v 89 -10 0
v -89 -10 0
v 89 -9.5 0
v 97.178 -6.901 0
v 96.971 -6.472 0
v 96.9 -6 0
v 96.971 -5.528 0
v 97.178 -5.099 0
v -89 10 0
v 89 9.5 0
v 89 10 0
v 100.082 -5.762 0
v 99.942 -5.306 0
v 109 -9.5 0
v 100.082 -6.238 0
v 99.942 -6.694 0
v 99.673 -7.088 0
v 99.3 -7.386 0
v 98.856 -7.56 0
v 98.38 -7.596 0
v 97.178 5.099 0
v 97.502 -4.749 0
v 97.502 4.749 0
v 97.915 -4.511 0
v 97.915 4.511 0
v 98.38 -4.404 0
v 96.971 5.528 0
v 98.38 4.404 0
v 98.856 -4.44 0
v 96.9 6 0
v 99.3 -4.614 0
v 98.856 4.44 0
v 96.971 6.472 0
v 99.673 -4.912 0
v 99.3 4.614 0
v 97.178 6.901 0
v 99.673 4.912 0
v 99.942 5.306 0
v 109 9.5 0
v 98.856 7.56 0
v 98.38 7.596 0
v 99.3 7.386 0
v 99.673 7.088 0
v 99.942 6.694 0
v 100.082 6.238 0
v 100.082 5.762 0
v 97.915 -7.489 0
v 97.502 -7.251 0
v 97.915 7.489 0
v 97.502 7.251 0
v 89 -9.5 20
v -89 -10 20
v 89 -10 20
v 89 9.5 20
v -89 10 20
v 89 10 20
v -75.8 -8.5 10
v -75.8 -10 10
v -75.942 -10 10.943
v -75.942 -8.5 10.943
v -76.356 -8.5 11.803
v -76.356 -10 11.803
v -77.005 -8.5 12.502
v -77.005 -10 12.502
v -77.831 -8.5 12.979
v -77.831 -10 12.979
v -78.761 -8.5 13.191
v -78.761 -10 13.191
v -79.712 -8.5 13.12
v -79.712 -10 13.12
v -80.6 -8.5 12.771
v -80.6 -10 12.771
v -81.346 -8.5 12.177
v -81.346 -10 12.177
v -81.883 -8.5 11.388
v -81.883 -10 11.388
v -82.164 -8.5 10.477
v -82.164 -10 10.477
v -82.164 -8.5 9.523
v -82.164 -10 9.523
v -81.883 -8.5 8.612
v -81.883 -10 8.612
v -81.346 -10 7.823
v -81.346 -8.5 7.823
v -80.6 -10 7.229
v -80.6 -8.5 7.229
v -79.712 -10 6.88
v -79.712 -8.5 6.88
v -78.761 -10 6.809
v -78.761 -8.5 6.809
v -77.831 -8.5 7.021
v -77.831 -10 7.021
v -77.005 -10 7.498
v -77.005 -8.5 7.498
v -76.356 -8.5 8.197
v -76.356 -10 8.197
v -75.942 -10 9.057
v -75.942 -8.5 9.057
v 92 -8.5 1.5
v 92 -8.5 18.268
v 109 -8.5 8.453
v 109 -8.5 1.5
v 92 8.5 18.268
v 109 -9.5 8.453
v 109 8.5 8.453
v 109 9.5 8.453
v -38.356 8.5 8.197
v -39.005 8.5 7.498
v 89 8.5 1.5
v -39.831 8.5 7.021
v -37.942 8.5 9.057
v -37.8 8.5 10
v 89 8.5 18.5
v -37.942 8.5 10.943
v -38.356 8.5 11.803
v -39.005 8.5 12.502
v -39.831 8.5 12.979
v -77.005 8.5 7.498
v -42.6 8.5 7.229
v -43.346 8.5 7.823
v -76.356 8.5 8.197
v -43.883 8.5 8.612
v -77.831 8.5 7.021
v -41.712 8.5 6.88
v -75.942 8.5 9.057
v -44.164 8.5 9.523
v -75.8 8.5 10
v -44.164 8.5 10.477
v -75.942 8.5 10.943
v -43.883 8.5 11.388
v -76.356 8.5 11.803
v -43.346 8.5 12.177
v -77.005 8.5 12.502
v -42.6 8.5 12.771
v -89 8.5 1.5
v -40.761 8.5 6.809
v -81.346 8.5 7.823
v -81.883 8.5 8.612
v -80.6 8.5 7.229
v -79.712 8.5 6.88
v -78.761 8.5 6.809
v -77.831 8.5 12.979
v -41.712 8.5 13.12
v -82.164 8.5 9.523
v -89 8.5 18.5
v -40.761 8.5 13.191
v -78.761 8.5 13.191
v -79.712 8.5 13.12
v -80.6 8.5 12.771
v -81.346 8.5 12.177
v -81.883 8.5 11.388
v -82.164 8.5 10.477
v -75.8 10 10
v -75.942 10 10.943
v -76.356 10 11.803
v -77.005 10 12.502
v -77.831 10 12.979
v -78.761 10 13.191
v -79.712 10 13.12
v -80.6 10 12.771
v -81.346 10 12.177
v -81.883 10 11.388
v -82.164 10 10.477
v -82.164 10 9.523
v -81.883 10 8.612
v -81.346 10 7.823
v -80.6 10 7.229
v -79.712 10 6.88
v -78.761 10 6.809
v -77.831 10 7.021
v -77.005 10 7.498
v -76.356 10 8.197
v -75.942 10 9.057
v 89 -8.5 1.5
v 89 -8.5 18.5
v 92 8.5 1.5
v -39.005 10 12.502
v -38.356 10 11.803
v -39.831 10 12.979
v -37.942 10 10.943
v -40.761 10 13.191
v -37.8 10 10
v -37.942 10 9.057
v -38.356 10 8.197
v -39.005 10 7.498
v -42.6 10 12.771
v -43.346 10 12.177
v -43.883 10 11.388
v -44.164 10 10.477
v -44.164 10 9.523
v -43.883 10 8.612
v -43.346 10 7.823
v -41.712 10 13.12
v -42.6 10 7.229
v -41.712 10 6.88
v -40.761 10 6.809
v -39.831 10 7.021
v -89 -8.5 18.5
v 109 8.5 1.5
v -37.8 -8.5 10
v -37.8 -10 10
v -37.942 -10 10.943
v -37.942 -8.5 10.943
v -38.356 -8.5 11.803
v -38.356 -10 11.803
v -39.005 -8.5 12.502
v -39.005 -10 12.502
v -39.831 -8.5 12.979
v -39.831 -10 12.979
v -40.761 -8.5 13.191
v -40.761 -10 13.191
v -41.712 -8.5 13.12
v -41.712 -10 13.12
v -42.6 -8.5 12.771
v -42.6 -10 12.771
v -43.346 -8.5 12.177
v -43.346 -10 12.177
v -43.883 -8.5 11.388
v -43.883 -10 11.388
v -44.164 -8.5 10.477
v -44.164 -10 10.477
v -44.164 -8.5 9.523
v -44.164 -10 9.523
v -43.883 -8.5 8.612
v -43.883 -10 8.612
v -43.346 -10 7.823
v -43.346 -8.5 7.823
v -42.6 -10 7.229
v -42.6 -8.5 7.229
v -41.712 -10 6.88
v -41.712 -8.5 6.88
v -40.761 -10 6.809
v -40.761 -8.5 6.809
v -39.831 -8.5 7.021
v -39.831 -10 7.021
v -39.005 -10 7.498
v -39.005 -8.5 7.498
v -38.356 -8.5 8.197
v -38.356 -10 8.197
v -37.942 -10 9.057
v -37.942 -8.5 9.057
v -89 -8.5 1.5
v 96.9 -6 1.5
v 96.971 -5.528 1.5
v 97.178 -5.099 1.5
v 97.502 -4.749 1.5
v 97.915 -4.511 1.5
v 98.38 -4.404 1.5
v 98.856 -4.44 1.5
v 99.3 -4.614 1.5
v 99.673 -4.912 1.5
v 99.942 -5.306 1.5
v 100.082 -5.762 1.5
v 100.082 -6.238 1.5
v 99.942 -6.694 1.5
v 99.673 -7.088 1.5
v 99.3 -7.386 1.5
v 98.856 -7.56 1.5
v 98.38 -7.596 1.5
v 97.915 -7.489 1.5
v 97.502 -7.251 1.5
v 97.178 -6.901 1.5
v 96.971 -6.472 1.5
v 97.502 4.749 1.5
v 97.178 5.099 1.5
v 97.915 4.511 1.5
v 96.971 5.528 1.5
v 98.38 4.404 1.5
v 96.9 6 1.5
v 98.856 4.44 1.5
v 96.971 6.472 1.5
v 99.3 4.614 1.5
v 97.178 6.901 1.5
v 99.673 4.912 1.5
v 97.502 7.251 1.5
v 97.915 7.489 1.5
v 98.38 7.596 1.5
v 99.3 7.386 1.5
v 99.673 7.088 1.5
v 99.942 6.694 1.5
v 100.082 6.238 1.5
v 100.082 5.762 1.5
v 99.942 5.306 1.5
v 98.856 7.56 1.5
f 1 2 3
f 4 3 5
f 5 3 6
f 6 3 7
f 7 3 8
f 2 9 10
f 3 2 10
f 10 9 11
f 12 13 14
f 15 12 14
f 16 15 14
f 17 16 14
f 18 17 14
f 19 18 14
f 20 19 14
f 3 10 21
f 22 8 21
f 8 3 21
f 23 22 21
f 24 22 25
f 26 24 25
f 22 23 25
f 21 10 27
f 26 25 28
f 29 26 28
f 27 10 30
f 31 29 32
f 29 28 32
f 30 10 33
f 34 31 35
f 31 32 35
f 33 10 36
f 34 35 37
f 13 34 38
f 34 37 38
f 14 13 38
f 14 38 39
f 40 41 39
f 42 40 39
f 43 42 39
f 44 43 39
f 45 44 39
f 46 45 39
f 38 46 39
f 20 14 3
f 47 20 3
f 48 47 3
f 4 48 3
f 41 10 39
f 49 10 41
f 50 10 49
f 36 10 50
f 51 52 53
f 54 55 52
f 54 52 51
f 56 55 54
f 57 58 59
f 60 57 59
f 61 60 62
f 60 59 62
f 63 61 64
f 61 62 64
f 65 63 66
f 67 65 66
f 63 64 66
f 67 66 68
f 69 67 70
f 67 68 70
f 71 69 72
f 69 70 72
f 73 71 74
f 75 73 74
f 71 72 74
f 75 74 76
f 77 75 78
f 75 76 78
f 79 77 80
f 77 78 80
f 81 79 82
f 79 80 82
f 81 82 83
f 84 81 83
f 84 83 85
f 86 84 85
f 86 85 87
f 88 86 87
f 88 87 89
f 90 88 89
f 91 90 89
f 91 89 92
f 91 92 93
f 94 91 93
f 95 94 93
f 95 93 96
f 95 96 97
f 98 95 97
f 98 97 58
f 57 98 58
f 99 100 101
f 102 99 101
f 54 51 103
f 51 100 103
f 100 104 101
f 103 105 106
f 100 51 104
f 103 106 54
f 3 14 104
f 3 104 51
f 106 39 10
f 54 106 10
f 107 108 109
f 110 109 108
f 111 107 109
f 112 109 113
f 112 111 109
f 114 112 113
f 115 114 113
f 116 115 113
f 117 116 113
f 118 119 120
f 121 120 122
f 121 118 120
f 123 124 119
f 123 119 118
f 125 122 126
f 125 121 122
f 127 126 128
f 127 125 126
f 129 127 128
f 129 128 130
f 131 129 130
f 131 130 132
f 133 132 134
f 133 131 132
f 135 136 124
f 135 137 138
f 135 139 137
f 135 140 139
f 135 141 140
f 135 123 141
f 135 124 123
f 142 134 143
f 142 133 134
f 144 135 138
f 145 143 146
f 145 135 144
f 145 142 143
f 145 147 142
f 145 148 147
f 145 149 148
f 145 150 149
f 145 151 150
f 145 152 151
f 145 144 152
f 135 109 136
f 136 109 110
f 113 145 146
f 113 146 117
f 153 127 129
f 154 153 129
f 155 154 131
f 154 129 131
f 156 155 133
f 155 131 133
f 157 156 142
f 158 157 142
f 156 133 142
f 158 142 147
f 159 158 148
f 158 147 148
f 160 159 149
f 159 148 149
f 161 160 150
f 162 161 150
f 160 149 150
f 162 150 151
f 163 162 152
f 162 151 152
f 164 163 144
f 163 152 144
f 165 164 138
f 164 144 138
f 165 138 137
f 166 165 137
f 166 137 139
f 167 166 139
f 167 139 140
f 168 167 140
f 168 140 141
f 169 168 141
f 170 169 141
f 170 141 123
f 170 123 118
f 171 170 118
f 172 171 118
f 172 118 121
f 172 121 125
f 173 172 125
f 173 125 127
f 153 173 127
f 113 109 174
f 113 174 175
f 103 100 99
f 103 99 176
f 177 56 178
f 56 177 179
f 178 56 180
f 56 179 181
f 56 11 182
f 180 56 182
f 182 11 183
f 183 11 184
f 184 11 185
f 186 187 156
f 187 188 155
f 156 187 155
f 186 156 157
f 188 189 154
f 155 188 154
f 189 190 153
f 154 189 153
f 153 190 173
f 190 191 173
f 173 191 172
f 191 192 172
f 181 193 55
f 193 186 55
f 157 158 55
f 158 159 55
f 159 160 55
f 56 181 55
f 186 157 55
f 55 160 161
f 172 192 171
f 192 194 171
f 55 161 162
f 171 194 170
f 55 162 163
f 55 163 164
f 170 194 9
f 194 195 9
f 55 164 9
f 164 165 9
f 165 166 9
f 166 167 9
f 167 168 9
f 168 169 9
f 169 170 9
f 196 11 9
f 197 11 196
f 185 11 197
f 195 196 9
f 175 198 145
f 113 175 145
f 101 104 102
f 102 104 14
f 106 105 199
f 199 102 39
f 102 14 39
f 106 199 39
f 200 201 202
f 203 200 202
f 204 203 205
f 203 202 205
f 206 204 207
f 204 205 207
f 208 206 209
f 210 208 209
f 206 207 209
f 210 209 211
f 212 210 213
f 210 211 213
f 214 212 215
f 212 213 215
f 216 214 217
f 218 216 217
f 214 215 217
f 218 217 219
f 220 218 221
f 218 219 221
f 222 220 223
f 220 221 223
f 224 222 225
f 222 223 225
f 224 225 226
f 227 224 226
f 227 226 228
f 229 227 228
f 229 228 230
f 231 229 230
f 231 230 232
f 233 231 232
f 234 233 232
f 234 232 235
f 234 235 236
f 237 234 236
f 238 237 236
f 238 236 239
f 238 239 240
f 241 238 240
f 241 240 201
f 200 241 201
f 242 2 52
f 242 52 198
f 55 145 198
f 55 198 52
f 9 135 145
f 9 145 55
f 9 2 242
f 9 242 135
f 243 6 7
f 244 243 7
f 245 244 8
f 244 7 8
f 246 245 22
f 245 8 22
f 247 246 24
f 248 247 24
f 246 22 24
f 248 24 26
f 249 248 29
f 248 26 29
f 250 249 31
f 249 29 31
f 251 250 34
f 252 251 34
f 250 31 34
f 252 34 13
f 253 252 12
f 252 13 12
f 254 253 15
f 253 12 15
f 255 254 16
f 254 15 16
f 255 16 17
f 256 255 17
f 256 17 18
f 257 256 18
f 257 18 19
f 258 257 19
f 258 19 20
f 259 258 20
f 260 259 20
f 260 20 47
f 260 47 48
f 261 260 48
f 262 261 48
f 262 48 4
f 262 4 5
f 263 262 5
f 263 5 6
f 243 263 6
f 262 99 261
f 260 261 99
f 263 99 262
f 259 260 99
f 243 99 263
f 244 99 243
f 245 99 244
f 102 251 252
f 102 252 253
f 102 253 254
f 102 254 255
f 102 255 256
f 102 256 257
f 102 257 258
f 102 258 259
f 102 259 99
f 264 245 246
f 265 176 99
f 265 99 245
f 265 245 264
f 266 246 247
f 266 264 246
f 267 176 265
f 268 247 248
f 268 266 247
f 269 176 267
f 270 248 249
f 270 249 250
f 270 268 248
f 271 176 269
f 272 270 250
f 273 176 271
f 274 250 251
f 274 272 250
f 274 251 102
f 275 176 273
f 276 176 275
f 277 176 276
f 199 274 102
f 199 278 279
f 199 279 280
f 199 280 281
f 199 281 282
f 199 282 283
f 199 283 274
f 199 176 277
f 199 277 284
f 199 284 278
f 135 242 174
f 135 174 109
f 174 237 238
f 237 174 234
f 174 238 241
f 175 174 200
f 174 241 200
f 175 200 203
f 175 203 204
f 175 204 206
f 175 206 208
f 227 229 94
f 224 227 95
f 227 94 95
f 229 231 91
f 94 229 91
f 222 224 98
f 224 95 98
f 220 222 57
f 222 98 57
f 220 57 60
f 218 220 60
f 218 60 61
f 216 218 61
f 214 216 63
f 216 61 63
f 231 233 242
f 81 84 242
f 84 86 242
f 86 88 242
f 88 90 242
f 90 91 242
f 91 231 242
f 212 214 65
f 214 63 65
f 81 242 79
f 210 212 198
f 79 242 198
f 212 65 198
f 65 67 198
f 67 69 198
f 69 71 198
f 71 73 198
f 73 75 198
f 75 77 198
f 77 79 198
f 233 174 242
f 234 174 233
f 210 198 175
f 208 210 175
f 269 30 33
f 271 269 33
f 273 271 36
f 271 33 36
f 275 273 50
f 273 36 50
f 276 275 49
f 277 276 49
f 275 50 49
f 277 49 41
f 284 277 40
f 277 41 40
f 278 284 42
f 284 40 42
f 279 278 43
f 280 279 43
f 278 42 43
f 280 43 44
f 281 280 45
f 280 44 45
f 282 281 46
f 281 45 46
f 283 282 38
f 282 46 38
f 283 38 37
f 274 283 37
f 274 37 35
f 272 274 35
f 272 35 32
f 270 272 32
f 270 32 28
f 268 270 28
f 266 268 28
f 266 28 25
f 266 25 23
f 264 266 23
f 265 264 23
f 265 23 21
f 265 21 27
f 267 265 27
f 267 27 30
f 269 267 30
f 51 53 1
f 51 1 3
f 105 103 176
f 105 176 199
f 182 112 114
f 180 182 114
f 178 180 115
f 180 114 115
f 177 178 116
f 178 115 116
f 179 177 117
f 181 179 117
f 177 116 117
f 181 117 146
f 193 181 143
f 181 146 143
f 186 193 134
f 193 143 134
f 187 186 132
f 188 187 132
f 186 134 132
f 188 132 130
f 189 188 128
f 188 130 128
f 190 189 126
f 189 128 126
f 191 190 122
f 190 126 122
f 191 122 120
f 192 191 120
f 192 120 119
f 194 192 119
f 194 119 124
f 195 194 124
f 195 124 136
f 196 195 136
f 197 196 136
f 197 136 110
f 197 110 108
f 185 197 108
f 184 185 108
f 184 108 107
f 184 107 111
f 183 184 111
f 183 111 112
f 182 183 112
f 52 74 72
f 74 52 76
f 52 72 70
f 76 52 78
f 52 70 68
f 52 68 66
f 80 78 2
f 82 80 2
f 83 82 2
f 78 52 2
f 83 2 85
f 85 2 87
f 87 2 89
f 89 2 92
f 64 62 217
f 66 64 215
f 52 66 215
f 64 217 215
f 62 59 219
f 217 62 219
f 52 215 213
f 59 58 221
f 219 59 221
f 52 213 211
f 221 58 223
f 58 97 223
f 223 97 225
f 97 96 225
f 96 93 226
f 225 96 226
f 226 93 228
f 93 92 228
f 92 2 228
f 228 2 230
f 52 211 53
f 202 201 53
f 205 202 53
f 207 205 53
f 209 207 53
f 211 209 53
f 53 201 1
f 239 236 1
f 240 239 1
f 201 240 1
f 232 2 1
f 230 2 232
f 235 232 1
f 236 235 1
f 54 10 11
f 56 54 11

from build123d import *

# Parameters (mm, degrees)
ESQUISSE1_W             = 178
ESQUISSE1_H             = 20
ESQUISSE1_W_2           = 20
BOSS_EXTRU_1_DEPTH      = 20
ESQUISSE3_W             = 17
ESQUISSE3_H             = 17
ENL_V_MAT_EXTRU_1_DEPTH = 178
ESQUISSE4_W             = 17
ESQUISSE4_H             = 17
ENL_V_MAT_EXTRU_2_DEPTH = 18.5
CHANFREIN1_SIZE         = 20
CHANFREIN1_SIZE2        = 11.547005384
ESQUISSE5_W             = 20
ESQUISSE5_H             = 0.5
ENL_V_MAT_EXTRU_3_DEPTH = 24
ESQUISSE6_R             = 1.6
ENL_V_MAT_EXTRU_4_DEPTH = 24
ESQUISSE7_R             = 3.2
ENL_V_MAT_EXTRU_5_DEPTH = 34


with BuildPart() as part:
    # Esquisse1 → Boss.-Extru.1 (new body)
    with BuildSketch(Plane.XY):
        Rectangle(ESQUISSE1_W, ESQUISSE1_H)
        with Locations((99, 0)):
            Rectangle(ESQUISSE1_W_2, ESQUISSE1_H)
    extrude(amount=BOSS_EXTRU_1_DEPTH)

    # Esquisse3 → Enlèv. mat.-Extru.1 (cut)
    with BuildSketch(Plane.ZY.offset(89)):
        with Locations((10, 0)):
            Rectangle(ESQUISSE3_W, ESQUISSE3_H)
    extrude(amount=-ENL_V_MAT_EXTRU_1_DEPTH, mode=Mode.SUBTRACT)

    # Esquisse4 → Enlèv. mat.-Extru.2 (cut)
    with BuildSketch(Plane.XY.offset(20)):
        with Locations((100.5, 0)):
            Rectangle(ESQUISSE4_W, ESQUISSE4_H)
    extrude(amount=-ENL_V_MAT_EXTRU_2_DEPTH, mode=Mode.SUBTRACT)

    # Chanfrein1
    chanfrein1_edges = [part.edges().sort_by_distance(p)[0] for p in [
        (109, 9.25, 20),
    ]]
    chanfrein1_side = [part.faces().sort_by_distance(p)[0] for p in [
        (2.875374557, 0, 20),
    ]]
    chamfer(chanfrein1_edges, length=CHANFREIN1_SIZE, length2=CHANFREIN1_SIZE2, reference=chanfrein1_side[0])

    # Esquisse5 → Enlèv. mat.-Extru.3 (cut)
    with BuildSketch(Plane(origin=(0, 0, 0), x_dir=(-1, 0, 0), z_dir=(0, 0, -1))):
        with Locations((-99, 9.75)):
            Rectangle(ESQUISSE5_W, ESQUISSE5_H)
        with Locations((-99, -9.75)):
            Rectangle(ESQUISSE5_W, ESQUISSE5_H)
    extrude(amount=-ENL_V_MAT_EXTRU_3_DEPTH, mode=Mode.SUBTRACT)

    # Esquisse6 → Enlèv. mat.-Extru.4 (cut)
    with BuildSketch(Plane(origin=(0, 0, 0), x_dir=(-1, 0, 0), z_dir=(0, 0, -1))):
        with Locations((-98.5, 6)):
            Circle(ESQUISSE6_R)
        with Locations((-98.5, -6)):
            Circle(ESQUISSE6_R)
    extrude(amount=-ENL_V_MAT_EXTRU_4_DEPTH, mode=Mode.SUBTRACT)

    # Esquisse7 → Enlèv. mat.-Extru.5 (cut)
    with BuildSketch(Plane.XZ.offset(10)):
        with Locations((-79, 10)):
            Circle(ESQUISSE7_R)
        with Locations((-41, 10)):
            Circle(ESQUISSE7_R)
    extrude(amount=-ENL_V_MAT_EXTRU_5_DEPTH, mode=Mode.SUBTRACT)


solid = part.part
